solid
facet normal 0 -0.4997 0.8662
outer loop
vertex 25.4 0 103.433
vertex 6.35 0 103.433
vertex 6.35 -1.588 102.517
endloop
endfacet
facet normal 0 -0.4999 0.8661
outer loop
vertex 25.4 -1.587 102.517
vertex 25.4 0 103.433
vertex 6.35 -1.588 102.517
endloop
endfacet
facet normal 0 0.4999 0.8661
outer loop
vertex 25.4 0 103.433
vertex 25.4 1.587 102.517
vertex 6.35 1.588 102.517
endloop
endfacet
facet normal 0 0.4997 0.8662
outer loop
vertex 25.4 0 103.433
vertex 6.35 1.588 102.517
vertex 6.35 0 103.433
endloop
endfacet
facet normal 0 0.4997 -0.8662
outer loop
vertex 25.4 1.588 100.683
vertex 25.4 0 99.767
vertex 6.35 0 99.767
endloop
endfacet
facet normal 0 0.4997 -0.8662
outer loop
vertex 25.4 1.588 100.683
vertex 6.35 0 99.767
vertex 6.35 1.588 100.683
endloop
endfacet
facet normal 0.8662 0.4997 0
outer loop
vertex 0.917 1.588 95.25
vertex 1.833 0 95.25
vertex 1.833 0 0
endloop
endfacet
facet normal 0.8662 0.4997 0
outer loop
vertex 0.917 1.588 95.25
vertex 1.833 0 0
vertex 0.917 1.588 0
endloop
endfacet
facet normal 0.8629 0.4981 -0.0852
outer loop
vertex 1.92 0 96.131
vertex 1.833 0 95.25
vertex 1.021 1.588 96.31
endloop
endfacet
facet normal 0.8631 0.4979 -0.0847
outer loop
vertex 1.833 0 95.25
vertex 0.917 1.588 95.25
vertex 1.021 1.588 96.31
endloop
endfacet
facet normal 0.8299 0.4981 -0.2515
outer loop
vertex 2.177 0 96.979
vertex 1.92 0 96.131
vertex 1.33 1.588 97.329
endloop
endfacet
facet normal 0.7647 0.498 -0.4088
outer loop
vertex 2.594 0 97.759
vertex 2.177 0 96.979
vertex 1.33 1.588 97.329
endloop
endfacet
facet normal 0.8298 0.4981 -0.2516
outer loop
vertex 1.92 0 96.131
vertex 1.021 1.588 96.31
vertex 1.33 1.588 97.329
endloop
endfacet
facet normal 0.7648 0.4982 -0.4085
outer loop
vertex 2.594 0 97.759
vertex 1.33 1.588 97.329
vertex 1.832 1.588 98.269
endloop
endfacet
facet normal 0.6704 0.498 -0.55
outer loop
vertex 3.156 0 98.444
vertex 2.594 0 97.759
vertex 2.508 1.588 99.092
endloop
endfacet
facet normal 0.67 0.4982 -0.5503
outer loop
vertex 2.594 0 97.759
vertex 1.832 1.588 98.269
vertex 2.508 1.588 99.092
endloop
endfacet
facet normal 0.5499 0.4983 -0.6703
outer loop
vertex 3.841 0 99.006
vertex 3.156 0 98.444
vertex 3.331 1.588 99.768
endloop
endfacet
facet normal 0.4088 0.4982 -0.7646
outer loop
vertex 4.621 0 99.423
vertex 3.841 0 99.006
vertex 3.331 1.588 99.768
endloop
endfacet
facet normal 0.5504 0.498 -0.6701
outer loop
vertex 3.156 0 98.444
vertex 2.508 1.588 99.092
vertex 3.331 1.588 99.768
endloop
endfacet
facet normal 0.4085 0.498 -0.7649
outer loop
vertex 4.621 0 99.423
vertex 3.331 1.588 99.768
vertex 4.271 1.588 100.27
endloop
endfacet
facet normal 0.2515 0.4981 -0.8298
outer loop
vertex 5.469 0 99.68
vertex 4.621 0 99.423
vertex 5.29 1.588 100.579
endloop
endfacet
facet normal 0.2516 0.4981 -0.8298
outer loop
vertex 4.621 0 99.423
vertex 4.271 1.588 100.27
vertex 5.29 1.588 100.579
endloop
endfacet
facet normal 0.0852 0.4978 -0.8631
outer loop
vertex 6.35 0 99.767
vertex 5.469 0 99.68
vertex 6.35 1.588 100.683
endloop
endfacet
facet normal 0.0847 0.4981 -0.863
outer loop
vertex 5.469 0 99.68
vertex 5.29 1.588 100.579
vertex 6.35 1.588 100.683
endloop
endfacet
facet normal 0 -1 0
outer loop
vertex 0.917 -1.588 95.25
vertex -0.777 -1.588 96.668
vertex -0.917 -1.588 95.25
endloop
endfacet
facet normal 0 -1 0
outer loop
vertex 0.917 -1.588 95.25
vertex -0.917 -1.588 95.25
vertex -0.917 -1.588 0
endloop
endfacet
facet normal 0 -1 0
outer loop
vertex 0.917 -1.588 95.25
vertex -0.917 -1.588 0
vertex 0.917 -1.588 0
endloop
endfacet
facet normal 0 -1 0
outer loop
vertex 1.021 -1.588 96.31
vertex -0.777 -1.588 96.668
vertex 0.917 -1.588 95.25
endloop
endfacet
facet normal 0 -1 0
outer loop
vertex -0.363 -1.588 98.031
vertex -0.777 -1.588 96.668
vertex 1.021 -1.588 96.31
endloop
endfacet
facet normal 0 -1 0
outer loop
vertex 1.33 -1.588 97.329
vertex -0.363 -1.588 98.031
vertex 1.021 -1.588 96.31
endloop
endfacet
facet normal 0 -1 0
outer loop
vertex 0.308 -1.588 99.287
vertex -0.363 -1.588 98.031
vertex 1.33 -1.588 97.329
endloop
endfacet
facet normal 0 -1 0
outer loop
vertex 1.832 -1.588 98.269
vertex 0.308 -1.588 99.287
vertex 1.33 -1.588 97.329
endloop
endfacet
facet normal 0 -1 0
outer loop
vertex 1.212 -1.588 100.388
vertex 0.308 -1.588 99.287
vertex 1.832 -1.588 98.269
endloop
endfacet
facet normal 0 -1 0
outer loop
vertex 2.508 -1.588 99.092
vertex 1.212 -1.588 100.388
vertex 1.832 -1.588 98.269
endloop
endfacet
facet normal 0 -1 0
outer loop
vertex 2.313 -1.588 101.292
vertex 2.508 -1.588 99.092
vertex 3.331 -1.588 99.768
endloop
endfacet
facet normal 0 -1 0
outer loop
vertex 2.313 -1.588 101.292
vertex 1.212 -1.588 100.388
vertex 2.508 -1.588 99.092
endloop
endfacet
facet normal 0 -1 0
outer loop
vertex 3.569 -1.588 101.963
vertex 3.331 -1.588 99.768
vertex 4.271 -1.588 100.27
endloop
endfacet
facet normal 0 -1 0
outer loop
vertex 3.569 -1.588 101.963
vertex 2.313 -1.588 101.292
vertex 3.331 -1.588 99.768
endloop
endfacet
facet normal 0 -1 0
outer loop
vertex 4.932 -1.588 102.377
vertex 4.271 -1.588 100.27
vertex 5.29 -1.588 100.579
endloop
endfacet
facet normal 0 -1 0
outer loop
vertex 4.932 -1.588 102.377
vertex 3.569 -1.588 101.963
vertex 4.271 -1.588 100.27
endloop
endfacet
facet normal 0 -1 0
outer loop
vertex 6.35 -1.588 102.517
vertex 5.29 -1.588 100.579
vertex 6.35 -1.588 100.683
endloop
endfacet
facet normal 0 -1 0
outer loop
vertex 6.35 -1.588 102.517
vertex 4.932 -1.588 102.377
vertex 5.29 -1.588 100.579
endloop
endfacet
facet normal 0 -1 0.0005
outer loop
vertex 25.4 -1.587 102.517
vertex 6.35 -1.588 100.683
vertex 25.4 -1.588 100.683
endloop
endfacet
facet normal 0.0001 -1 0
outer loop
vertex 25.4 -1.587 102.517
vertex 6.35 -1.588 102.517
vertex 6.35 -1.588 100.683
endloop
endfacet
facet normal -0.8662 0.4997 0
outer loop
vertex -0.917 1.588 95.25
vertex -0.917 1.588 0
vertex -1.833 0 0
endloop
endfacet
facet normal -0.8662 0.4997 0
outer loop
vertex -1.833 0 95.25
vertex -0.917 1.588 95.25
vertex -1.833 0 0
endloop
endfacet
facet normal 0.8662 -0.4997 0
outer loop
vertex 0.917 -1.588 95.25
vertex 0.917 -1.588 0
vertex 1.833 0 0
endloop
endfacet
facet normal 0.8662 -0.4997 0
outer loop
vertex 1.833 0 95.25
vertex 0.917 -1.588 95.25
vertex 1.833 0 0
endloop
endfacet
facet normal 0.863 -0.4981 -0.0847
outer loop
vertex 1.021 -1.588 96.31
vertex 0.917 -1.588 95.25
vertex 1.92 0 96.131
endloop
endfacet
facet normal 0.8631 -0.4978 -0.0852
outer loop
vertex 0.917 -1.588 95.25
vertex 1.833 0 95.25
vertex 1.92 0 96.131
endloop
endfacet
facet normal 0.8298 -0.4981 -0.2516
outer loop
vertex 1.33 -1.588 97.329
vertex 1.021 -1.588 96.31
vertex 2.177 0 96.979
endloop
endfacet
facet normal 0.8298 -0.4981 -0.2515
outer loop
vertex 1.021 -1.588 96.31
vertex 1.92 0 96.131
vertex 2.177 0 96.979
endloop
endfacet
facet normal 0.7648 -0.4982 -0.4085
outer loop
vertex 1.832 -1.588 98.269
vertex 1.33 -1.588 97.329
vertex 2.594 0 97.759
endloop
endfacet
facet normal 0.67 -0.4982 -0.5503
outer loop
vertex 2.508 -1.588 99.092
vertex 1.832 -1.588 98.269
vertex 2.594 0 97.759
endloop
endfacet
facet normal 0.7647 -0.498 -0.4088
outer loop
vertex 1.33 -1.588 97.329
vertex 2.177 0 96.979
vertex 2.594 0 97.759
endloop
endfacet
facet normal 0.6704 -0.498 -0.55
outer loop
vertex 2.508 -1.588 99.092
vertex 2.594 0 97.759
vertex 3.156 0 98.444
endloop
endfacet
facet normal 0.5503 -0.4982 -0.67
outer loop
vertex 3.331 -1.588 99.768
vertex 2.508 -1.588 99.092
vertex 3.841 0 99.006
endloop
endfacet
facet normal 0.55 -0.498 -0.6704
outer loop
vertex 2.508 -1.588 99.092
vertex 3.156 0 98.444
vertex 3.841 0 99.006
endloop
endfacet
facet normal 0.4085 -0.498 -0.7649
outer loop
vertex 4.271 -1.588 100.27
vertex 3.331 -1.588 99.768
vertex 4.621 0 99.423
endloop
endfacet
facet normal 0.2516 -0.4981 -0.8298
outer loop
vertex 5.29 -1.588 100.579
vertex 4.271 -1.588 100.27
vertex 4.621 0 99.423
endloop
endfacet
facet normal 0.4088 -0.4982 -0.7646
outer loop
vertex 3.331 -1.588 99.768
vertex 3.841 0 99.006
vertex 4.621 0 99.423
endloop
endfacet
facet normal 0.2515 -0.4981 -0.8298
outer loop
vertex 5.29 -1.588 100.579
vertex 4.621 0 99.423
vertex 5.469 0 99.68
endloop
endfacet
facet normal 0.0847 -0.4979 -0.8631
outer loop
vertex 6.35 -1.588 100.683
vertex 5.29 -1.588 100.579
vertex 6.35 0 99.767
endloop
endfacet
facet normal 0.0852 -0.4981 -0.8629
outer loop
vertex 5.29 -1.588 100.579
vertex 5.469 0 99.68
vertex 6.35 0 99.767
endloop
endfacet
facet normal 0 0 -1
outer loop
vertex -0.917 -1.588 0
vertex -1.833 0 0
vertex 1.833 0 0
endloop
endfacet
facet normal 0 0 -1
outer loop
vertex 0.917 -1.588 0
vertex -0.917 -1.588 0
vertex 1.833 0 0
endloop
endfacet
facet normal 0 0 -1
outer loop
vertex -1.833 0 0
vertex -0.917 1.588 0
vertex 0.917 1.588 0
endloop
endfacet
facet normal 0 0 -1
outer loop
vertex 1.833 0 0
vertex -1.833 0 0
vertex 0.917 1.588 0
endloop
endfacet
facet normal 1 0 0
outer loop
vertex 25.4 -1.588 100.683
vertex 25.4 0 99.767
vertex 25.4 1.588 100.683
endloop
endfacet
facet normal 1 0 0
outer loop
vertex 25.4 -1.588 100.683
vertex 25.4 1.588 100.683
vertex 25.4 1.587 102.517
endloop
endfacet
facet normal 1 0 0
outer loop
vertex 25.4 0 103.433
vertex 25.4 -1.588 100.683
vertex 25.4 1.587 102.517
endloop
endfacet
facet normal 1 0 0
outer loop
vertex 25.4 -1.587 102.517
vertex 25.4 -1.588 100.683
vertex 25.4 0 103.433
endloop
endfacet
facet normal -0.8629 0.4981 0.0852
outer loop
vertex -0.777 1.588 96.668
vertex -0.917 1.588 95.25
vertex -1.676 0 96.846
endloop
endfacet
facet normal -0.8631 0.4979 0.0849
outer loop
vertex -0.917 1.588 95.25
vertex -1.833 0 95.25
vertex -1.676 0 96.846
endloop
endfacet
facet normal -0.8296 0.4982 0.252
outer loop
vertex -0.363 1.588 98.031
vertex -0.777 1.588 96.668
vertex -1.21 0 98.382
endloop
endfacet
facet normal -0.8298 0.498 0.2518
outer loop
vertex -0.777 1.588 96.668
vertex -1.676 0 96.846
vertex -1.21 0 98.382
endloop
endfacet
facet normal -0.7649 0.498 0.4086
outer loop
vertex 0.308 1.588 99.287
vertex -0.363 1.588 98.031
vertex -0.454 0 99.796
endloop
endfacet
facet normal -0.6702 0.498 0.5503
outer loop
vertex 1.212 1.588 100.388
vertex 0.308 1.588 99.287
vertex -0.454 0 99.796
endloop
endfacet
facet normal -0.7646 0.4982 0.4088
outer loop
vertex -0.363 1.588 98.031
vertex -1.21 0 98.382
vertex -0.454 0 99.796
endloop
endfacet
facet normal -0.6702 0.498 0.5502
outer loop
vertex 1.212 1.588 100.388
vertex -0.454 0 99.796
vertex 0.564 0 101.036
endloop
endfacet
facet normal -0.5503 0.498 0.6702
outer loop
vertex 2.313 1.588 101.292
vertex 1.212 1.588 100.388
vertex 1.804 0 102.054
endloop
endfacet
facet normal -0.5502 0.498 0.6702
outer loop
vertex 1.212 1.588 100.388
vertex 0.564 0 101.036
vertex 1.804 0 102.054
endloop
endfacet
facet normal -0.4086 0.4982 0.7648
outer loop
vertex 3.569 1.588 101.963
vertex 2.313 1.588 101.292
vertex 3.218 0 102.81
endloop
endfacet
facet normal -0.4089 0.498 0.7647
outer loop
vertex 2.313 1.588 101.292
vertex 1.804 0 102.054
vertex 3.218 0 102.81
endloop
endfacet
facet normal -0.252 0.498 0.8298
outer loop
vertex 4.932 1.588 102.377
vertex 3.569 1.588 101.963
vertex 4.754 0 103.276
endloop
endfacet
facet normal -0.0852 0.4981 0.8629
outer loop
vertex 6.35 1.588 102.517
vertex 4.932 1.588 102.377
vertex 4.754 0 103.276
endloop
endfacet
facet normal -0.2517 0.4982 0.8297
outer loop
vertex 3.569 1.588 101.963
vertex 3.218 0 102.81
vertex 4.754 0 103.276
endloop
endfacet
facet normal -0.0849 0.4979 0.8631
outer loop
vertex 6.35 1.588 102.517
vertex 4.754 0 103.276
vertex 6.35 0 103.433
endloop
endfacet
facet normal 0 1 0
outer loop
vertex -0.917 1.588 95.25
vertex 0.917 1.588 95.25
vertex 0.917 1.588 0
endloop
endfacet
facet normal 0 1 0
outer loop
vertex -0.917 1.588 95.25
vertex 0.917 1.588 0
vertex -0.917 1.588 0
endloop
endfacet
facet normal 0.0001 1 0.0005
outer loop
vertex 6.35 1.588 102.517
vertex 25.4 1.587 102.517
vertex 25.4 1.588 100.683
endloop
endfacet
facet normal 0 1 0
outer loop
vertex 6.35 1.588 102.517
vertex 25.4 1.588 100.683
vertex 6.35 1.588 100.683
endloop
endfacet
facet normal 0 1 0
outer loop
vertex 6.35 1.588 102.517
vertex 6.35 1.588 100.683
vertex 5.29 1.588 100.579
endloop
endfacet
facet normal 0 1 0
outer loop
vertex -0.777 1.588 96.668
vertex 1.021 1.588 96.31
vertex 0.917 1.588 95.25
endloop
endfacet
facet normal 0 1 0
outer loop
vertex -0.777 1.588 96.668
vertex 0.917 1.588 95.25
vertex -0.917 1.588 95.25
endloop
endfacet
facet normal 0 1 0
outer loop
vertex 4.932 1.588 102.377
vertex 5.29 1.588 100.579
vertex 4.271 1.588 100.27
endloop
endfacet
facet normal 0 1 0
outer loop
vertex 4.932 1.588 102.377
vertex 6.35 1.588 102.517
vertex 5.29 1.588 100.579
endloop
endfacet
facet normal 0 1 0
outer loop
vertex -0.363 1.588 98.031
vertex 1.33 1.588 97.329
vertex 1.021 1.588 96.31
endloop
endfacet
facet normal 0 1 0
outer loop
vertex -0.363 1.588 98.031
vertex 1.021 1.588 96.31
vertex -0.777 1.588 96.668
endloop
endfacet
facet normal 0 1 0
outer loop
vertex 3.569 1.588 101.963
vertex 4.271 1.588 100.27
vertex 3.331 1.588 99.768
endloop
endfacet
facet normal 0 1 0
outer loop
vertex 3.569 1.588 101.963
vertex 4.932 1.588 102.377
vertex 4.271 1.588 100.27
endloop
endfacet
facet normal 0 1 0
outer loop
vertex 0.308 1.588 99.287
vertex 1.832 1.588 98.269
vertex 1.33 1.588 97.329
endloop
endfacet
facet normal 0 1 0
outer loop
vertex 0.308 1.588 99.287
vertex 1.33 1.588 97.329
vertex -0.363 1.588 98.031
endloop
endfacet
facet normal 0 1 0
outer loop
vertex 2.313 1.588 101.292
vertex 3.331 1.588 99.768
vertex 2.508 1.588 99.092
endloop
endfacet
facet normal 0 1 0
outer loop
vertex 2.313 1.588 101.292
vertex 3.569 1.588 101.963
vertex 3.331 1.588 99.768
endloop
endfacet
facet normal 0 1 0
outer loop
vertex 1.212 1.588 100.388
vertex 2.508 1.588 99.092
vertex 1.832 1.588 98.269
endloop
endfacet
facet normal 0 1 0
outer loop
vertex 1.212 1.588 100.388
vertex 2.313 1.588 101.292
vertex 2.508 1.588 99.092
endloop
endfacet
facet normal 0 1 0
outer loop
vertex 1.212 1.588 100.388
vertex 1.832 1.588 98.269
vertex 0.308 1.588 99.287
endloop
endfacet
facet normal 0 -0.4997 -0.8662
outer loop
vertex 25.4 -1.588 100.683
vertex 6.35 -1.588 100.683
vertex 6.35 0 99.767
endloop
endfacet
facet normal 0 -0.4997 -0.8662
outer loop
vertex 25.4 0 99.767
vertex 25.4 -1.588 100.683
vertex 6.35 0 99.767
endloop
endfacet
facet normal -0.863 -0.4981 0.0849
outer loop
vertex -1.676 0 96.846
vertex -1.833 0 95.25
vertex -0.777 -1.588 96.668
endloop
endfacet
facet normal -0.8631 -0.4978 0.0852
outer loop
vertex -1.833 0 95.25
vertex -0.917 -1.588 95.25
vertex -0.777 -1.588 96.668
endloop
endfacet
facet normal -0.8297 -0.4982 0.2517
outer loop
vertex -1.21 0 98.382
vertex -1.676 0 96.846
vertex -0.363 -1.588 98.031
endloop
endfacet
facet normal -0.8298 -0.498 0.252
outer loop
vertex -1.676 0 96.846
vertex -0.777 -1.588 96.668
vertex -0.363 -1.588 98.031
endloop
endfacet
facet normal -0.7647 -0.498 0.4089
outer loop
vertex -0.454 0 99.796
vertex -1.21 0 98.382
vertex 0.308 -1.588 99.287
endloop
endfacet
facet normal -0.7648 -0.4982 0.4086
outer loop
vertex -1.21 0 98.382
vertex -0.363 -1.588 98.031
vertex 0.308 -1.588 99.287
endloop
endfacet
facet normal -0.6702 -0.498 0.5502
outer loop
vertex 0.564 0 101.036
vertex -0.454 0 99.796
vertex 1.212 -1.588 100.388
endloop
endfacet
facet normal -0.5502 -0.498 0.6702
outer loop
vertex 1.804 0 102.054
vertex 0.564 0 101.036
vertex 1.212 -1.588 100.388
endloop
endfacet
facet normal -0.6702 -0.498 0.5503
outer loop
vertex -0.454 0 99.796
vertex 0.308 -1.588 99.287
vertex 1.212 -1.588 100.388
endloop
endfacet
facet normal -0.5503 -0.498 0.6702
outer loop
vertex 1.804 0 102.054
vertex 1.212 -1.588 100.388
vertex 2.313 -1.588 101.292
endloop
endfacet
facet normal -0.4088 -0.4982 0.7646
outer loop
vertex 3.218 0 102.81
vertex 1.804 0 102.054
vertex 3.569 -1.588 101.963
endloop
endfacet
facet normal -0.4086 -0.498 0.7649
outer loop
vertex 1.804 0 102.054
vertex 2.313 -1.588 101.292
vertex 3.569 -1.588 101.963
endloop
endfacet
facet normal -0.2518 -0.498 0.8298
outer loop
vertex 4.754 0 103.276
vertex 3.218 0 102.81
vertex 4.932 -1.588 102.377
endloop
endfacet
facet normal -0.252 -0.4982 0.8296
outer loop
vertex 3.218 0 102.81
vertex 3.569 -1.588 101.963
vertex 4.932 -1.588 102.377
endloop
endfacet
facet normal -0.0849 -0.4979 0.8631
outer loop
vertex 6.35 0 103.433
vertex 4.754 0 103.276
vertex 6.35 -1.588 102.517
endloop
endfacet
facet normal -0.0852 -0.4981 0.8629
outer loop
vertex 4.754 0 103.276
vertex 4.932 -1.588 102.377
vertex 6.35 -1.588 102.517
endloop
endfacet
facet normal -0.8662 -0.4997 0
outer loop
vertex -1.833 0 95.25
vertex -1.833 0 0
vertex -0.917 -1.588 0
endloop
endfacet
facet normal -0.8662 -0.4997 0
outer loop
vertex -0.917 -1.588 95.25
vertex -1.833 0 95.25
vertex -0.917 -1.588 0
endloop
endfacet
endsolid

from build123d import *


with BuildPart() as f2:
    # F2: sweep along a path in F1
    with BuildLine(Plane.XZ) as f2_path:
        Line((0, 0), (0, 95.25))
        ThreePointArc((0, 95.25), (1.859872, 99.740128), (6.35, 101.6))
        Line((6.35, 101.6), (25.4, 101.6))
    # F0 (on Top) → F2 (sweep)
    with BuildSketch(Plane.XY):
        Polygon((0.916544, 1.5875), (-0.916544, 1.5875), (-1.833087, 0), (-0.916544, -1.5875), (0.916544, -1.5875), (1.833087, 0), align=None)
    sweep(path=f2_path.line)


solid = f2.part
